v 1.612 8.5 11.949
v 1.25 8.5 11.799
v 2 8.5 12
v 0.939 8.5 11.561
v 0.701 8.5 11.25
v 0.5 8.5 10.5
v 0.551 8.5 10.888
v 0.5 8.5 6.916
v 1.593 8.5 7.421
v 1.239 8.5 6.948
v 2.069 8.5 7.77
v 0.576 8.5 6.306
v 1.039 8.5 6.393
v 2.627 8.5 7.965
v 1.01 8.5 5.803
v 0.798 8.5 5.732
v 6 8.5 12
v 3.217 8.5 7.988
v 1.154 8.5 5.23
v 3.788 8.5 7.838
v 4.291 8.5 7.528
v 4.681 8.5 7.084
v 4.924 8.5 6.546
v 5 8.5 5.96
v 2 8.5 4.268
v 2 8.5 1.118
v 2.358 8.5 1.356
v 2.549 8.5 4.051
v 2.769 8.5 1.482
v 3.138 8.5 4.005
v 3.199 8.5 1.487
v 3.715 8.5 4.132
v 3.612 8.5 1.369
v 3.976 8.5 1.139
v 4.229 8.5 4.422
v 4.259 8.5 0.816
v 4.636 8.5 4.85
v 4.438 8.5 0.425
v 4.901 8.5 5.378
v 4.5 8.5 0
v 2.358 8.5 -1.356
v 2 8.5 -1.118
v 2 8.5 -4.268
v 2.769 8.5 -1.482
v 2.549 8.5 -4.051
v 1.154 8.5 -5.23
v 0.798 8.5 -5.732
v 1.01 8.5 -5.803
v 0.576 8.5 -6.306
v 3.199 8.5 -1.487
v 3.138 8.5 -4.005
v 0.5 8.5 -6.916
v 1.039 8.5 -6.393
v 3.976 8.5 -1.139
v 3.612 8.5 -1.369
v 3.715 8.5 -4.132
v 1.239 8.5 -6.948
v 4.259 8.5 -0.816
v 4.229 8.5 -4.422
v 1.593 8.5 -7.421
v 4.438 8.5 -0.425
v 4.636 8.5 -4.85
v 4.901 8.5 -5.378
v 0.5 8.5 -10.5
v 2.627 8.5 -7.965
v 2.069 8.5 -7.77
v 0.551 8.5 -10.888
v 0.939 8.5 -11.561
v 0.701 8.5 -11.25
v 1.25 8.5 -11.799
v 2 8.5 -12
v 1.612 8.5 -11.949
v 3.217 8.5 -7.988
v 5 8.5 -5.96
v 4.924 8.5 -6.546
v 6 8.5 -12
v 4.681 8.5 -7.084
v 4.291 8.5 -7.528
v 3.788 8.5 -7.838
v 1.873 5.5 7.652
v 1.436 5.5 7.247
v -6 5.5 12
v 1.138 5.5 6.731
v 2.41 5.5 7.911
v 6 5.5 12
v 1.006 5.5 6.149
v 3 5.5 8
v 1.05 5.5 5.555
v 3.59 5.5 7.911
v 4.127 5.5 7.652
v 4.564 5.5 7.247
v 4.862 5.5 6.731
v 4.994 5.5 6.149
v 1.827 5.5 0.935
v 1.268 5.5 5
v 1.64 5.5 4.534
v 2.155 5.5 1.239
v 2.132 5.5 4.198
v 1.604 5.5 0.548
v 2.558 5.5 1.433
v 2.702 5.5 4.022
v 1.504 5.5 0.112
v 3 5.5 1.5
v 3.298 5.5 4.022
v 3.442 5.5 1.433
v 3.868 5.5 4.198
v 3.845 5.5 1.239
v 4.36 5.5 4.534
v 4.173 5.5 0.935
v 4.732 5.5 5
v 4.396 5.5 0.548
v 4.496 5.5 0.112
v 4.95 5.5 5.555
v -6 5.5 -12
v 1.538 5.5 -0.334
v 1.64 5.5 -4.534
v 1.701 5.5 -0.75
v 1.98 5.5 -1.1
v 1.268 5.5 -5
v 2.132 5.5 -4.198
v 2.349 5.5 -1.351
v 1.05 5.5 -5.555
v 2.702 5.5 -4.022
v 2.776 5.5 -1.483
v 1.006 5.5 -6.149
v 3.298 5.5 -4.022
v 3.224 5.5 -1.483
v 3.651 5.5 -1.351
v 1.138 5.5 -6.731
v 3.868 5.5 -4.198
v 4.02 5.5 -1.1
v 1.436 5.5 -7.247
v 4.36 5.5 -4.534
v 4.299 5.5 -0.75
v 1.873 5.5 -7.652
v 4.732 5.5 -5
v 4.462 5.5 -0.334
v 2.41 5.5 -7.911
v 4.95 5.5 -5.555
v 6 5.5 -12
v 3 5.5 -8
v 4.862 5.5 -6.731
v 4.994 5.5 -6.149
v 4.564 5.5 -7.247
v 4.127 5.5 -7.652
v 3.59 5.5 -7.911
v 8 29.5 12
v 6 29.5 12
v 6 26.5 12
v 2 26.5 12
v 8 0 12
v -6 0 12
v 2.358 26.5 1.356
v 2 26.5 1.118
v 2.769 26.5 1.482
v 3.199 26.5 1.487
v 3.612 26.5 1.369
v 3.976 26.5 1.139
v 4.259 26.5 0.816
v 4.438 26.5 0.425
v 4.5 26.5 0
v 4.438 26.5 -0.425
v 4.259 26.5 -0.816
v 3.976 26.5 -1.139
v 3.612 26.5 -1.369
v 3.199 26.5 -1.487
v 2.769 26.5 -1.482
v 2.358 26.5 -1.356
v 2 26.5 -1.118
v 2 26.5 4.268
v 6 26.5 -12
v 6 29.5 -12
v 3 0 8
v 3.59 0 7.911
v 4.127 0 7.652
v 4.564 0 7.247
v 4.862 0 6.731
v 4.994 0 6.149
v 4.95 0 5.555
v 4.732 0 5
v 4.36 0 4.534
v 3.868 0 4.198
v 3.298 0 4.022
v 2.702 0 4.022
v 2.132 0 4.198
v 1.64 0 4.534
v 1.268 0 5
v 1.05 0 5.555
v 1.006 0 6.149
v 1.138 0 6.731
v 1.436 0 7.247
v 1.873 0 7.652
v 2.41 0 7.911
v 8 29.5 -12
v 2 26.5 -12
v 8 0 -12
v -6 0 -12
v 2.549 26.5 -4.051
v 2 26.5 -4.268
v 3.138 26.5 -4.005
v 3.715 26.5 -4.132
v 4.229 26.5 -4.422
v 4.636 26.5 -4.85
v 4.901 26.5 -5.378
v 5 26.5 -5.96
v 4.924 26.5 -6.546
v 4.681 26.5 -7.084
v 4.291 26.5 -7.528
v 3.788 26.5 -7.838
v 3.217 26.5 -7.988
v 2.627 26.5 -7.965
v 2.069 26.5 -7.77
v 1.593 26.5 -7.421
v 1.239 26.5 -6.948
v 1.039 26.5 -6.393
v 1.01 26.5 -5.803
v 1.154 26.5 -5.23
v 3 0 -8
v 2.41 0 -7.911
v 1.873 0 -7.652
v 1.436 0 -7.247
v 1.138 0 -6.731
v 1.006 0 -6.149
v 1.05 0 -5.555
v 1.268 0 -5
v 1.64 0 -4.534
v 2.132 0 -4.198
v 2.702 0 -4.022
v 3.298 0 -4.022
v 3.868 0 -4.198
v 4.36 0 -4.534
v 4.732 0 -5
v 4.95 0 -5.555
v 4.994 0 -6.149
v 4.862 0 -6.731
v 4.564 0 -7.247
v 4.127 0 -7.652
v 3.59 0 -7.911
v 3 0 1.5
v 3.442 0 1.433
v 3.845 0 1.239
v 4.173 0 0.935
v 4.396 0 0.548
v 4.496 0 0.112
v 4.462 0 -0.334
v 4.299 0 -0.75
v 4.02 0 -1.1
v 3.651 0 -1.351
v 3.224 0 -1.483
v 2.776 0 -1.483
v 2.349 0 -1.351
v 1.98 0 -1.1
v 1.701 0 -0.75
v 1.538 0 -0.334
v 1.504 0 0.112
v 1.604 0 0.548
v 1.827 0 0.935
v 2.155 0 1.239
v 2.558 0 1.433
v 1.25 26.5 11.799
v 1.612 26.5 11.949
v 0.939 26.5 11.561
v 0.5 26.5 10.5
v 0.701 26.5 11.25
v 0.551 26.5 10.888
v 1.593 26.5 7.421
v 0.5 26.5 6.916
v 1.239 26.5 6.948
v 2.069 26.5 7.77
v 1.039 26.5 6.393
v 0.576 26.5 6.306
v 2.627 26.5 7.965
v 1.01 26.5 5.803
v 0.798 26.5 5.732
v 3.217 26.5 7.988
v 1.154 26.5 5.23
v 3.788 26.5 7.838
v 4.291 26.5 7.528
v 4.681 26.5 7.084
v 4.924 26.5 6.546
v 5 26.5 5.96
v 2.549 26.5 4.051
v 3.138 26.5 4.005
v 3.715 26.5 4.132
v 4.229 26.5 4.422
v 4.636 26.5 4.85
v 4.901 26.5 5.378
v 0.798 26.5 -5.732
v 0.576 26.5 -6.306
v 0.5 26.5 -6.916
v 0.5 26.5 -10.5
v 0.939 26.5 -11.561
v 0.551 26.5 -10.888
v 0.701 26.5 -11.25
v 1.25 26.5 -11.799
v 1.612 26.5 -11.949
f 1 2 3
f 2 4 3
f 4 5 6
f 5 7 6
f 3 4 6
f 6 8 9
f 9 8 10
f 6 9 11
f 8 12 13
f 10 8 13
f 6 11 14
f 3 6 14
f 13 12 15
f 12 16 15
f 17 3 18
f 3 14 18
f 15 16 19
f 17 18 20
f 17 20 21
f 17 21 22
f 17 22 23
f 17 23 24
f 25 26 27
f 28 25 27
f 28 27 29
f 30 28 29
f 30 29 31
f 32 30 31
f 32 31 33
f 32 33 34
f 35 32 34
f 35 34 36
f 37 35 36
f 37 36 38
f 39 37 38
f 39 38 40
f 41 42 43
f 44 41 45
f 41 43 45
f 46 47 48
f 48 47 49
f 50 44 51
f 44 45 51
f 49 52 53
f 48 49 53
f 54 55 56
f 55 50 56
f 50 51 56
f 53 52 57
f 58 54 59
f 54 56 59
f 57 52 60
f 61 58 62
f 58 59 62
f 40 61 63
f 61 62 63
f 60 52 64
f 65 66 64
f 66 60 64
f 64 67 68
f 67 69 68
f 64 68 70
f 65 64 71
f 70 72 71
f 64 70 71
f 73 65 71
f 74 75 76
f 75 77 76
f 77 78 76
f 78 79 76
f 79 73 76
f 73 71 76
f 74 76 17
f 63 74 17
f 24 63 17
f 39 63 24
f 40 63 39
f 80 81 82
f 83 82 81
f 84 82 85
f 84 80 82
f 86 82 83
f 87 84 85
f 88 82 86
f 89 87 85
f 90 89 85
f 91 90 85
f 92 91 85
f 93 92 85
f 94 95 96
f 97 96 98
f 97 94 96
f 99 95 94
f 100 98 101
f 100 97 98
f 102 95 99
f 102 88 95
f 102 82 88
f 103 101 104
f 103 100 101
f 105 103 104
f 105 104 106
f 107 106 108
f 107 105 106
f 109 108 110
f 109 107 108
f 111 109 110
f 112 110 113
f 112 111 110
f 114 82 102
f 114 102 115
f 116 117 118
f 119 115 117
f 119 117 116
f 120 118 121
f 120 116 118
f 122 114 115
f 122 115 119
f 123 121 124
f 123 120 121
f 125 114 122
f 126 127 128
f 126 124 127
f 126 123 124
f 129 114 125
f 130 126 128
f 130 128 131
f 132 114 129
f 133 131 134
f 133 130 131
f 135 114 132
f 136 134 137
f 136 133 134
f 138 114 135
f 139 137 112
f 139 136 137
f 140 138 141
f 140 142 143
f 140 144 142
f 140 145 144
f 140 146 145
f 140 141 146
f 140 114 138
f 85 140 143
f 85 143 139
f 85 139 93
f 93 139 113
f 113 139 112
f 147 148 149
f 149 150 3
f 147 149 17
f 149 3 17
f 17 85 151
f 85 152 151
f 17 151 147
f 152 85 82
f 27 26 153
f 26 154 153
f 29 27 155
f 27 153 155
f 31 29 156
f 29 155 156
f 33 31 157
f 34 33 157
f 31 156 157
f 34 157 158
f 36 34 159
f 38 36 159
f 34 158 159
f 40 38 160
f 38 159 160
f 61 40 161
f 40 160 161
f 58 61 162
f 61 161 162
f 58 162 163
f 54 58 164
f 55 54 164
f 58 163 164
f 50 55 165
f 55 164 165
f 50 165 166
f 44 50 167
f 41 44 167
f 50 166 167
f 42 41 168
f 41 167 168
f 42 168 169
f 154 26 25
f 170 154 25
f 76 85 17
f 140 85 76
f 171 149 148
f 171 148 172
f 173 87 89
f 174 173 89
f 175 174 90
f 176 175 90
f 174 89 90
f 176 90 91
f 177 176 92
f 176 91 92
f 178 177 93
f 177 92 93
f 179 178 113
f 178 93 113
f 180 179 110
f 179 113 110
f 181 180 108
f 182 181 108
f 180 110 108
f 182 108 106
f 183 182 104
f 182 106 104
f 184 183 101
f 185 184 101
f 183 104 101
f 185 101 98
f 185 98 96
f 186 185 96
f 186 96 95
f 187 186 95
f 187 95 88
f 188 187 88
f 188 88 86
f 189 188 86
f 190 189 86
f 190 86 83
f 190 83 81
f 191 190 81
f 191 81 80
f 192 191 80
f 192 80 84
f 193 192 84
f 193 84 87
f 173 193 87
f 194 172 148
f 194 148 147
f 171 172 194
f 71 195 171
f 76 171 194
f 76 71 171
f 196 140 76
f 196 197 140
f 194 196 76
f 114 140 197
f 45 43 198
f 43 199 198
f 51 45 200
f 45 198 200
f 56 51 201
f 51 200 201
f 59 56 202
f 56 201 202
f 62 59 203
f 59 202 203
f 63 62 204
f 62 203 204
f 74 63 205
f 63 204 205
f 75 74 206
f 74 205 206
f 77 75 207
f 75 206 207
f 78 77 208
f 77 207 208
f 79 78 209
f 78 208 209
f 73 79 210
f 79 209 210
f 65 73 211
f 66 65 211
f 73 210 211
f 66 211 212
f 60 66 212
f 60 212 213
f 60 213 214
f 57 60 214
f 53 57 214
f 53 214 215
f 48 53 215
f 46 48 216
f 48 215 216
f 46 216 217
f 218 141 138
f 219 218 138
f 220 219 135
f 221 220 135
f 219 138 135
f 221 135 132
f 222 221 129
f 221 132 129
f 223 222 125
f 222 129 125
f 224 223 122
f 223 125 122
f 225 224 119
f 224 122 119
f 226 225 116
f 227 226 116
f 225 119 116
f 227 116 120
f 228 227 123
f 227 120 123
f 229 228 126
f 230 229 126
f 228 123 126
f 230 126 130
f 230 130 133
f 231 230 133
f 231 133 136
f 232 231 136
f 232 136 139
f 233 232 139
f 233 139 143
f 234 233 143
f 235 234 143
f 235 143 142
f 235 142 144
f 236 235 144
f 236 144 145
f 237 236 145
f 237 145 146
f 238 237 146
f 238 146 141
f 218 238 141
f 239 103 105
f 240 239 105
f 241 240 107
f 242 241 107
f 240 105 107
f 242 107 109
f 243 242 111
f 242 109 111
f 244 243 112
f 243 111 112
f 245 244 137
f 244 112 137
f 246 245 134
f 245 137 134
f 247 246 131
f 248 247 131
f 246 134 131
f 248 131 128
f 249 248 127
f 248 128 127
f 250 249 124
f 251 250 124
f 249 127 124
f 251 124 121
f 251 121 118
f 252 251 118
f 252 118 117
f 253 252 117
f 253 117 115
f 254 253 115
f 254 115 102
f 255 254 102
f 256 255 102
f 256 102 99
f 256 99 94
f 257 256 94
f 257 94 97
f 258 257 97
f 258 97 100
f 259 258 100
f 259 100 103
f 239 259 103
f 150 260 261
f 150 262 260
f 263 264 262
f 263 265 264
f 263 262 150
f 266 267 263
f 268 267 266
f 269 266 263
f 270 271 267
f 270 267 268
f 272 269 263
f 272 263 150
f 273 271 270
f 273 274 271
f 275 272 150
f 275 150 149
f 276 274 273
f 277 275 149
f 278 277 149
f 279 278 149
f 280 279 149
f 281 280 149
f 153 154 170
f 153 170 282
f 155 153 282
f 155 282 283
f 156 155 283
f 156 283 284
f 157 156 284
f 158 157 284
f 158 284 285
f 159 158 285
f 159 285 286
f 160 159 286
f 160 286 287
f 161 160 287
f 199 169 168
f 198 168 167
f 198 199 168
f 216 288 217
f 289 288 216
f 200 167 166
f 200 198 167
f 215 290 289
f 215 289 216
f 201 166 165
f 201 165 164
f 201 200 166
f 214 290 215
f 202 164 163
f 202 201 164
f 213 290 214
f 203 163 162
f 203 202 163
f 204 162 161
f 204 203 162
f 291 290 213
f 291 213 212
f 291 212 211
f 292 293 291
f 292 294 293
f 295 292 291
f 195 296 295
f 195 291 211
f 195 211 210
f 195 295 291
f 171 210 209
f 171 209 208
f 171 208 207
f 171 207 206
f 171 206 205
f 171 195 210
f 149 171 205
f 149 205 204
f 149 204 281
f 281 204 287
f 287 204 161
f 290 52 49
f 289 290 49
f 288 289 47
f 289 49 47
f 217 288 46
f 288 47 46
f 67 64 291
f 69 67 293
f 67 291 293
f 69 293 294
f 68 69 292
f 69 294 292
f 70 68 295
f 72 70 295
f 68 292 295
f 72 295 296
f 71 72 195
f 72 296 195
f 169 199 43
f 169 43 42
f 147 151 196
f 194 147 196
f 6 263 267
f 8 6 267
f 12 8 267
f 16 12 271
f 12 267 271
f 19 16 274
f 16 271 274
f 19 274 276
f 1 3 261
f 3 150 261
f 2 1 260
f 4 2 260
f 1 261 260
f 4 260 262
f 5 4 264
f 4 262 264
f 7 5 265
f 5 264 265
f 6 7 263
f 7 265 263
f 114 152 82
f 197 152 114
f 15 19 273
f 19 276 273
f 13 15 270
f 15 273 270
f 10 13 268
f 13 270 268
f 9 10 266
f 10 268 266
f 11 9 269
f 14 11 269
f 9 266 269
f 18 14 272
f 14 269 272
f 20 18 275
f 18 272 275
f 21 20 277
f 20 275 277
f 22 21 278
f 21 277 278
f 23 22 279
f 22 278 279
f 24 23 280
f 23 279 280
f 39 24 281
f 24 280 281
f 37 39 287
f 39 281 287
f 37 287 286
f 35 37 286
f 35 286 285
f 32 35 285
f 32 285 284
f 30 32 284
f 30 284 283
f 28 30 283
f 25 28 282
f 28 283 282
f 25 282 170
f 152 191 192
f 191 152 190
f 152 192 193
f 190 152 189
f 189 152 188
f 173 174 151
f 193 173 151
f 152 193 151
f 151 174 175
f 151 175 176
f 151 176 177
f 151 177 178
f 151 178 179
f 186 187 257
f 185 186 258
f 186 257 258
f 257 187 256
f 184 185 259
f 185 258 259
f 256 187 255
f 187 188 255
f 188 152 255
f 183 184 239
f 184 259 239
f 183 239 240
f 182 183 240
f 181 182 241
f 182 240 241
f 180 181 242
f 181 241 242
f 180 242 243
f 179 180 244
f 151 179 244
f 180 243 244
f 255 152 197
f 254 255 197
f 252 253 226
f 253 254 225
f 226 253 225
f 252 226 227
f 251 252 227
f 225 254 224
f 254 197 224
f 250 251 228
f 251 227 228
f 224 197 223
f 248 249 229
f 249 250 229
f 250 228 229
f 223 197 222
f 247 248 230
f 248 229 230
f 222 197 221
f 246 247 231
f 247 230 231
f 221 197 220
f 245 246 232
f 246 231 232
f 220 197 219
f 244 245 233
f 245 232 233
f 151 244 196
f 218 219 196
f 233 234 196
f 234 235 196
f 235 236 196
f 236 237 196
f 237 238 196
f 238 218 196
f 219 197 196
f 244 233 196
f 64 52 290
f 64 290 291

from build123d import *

# Parameters (mm, degrees)
SKETCH1_W           = 12
SKETCH1_H           = 24
BOSS_EXTRUDE1_DEPTH = 5.5
SKETCH2_W           = 2
SKETCH2_H           = 24
BOSS_EXTRUDE2_DEPTH = 29.5
BOSS_EXTRUDE4_START = 3
SKETCH4_W           = 5.5
SKETCH4_H           = 24
BOSS_EXTRUDE4_DEPTH = 18
SKETCH5_W           = 9.25
SKETCH5_H           = 18
CUT_EXTRUDE1_DEPTH  = 1.5
FILLET1_R           = 2.5
SKETCH6_R           = 2
SKETCH6_R_2         = 1.5
CUT_EXTRUDE2_DEPTH  = 31.170349683
FILLET2_R           = 1.5


with BuildPart() as part:
    # Sketch1 → Boss-Extrude1 (new body)
    with BuildSketch(Plane(origin=(0, 0, 0), x_dir=(1, 0, 0), z_dir=(0, 1, 0))):
        Rectangle(SKETCH1_W, SKETCH1_H)
    extrude(amount=BOSS_EXTRUDE1_DEPTH)

    # Sketch2 → Boss-Extrude2 (add)
    with BuildSketch(Plane(origin=(0, 0, 0), x_dir=(1, 0, 0), z_dir=(0, 1, 0))):
        with Locations((7, 0)):
            Rectangle(SKETCH2_W, SKETCH2_H)
    extrude(amount=BOSS_EXTRUDE2_DEPTH)

    # Sketch4 → Boss-Extrude4 (add)
    with BuildSketch(Plane(origin=(0, 5.5, 0), x_dir=(1, 0, 0), z_dir=(0, 1, 0)).offset(BOSS_EXTRUDE4_START)):
        with Locations((3.25, 0)):
            Rectangle(SKETCH4_W, SKETCH4_H)
    extrude(amount=BOSS_EXTRUDE4_DEPTH)

    # Sketch5 → Cut-Extrude1 (cut)
    with BuildSketch(Plane.ZY.offset(-0.5)):
        with Locations((0, 17.5)):
            Rectangle(SKETCH5_W, SKETCH5_H)
    extrude(amount=-CUT_EXTRUDE1_DEPTH, mode=Mode.SUBTRACT)

    # Fillet1
    # the kernel refuses this fillet: 2.5 mm, written as the material it takes off along each edge
    with BuildSketch(Plane(origin=(0.5, 32.228219619, 4.625), x_dir=(0, 0, 1), z_dir=(0, -1, 0)), Plane(origin=(0.5, 8.5, -4.625), x_dir=(0, 0, -1), z_dir=(0, 1, 0))) as fillet1_piece_1:
        with BuildLine():
            CenterArc((2.291287847, -2.5), FILLET1_R, 90, 66.421821522)
            Line((0, -1.5), (0, 0))
            Line((0, 0), (2.291287847, 0))
        make_face()
    extrude(amount=23.728219619, mode=Mode.SUBTRACT)

    # Sketch6 → Cut-Extrude2 (cut, through all)
    with BuildSketch(Plane(origin=(0, 26.5, 0), x_dir=(1, 0, 0), z_dir=(0, 1, 0))):
        with Locations(Location((3, -6, 0), (0, 0, 270))):
            Circle(SKETCH6_R)
        with Locations(Location((3, 6, 0), (0, 0, 90))):
            Circle(SKETCH6_R)
        with Locations(Location((3, 0, 0), (0, 0, 270))):
            Circle(SKETCH6_R_2)
    extrude(amount=-CUT_EXTRUDE2_DEPTH, mode=Mode.SUBTRACT)

    # Fillet2
    fillet2_edges = [part.edges().sort_by_distance(p)[0] for p in [
        (0.5, 17.5, -12),
        (0.5, 17.5, 12),
    ]]
    fillet(fillet2_edges, radius=FILLET2_R)


solid = part.part
